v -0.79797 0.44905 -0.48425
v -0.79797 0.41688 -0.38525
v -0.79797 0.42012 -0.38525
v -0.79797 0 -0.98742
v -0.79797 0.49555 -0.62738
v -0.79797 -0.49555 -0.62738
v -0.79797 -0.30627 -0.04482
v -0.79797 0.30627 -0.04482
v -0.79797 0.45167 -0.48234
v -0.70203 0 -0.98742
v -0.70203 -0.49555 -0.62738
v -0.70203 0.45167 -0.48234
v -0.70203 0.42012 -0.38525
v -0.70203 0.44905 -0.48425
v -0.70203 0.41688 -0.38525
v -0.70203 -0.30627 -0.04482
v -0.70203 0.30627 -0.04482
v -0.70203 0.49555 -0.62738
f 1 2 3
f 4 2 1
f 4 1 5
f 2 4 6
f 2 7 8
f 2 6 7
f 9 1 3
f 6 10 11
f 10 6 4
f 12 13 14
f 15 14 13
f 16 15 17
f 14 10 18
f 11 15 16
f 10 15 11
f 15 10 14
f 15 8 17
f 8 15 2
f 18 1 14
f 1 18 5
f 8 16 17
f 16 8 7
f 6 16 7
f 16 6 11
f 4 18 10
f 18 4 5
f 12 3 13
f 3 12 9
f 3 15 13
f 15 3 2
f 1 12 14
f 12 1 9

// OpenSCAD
EPS = 0.01;

module circle_extrude(r, h) {
    translate([0, 0, -h/2])
    linear_extrude(height=h)
    circle(r=r);
}

module sketch0() {
    union() {
        translate([0.5210526315789474, 0, 0])
        circle_extrude(0.5210526315789474, 0.0859375 + EPS);
        
        translate([0.5101973684210527, 0.36907894736842106, 0])
        circle_extrude(0.0868421052631579, 0.0859375 + EPS);
        
        translate([0.8901315789473685, 0.010855263157894738, 0])
        circle_extrude(0.0868421052631579, 0.0859375 + EPS);
    }
}

translate([-0.75, 0.0, 0.0546875])
rotate([0, 90, 0])
sketch0();
